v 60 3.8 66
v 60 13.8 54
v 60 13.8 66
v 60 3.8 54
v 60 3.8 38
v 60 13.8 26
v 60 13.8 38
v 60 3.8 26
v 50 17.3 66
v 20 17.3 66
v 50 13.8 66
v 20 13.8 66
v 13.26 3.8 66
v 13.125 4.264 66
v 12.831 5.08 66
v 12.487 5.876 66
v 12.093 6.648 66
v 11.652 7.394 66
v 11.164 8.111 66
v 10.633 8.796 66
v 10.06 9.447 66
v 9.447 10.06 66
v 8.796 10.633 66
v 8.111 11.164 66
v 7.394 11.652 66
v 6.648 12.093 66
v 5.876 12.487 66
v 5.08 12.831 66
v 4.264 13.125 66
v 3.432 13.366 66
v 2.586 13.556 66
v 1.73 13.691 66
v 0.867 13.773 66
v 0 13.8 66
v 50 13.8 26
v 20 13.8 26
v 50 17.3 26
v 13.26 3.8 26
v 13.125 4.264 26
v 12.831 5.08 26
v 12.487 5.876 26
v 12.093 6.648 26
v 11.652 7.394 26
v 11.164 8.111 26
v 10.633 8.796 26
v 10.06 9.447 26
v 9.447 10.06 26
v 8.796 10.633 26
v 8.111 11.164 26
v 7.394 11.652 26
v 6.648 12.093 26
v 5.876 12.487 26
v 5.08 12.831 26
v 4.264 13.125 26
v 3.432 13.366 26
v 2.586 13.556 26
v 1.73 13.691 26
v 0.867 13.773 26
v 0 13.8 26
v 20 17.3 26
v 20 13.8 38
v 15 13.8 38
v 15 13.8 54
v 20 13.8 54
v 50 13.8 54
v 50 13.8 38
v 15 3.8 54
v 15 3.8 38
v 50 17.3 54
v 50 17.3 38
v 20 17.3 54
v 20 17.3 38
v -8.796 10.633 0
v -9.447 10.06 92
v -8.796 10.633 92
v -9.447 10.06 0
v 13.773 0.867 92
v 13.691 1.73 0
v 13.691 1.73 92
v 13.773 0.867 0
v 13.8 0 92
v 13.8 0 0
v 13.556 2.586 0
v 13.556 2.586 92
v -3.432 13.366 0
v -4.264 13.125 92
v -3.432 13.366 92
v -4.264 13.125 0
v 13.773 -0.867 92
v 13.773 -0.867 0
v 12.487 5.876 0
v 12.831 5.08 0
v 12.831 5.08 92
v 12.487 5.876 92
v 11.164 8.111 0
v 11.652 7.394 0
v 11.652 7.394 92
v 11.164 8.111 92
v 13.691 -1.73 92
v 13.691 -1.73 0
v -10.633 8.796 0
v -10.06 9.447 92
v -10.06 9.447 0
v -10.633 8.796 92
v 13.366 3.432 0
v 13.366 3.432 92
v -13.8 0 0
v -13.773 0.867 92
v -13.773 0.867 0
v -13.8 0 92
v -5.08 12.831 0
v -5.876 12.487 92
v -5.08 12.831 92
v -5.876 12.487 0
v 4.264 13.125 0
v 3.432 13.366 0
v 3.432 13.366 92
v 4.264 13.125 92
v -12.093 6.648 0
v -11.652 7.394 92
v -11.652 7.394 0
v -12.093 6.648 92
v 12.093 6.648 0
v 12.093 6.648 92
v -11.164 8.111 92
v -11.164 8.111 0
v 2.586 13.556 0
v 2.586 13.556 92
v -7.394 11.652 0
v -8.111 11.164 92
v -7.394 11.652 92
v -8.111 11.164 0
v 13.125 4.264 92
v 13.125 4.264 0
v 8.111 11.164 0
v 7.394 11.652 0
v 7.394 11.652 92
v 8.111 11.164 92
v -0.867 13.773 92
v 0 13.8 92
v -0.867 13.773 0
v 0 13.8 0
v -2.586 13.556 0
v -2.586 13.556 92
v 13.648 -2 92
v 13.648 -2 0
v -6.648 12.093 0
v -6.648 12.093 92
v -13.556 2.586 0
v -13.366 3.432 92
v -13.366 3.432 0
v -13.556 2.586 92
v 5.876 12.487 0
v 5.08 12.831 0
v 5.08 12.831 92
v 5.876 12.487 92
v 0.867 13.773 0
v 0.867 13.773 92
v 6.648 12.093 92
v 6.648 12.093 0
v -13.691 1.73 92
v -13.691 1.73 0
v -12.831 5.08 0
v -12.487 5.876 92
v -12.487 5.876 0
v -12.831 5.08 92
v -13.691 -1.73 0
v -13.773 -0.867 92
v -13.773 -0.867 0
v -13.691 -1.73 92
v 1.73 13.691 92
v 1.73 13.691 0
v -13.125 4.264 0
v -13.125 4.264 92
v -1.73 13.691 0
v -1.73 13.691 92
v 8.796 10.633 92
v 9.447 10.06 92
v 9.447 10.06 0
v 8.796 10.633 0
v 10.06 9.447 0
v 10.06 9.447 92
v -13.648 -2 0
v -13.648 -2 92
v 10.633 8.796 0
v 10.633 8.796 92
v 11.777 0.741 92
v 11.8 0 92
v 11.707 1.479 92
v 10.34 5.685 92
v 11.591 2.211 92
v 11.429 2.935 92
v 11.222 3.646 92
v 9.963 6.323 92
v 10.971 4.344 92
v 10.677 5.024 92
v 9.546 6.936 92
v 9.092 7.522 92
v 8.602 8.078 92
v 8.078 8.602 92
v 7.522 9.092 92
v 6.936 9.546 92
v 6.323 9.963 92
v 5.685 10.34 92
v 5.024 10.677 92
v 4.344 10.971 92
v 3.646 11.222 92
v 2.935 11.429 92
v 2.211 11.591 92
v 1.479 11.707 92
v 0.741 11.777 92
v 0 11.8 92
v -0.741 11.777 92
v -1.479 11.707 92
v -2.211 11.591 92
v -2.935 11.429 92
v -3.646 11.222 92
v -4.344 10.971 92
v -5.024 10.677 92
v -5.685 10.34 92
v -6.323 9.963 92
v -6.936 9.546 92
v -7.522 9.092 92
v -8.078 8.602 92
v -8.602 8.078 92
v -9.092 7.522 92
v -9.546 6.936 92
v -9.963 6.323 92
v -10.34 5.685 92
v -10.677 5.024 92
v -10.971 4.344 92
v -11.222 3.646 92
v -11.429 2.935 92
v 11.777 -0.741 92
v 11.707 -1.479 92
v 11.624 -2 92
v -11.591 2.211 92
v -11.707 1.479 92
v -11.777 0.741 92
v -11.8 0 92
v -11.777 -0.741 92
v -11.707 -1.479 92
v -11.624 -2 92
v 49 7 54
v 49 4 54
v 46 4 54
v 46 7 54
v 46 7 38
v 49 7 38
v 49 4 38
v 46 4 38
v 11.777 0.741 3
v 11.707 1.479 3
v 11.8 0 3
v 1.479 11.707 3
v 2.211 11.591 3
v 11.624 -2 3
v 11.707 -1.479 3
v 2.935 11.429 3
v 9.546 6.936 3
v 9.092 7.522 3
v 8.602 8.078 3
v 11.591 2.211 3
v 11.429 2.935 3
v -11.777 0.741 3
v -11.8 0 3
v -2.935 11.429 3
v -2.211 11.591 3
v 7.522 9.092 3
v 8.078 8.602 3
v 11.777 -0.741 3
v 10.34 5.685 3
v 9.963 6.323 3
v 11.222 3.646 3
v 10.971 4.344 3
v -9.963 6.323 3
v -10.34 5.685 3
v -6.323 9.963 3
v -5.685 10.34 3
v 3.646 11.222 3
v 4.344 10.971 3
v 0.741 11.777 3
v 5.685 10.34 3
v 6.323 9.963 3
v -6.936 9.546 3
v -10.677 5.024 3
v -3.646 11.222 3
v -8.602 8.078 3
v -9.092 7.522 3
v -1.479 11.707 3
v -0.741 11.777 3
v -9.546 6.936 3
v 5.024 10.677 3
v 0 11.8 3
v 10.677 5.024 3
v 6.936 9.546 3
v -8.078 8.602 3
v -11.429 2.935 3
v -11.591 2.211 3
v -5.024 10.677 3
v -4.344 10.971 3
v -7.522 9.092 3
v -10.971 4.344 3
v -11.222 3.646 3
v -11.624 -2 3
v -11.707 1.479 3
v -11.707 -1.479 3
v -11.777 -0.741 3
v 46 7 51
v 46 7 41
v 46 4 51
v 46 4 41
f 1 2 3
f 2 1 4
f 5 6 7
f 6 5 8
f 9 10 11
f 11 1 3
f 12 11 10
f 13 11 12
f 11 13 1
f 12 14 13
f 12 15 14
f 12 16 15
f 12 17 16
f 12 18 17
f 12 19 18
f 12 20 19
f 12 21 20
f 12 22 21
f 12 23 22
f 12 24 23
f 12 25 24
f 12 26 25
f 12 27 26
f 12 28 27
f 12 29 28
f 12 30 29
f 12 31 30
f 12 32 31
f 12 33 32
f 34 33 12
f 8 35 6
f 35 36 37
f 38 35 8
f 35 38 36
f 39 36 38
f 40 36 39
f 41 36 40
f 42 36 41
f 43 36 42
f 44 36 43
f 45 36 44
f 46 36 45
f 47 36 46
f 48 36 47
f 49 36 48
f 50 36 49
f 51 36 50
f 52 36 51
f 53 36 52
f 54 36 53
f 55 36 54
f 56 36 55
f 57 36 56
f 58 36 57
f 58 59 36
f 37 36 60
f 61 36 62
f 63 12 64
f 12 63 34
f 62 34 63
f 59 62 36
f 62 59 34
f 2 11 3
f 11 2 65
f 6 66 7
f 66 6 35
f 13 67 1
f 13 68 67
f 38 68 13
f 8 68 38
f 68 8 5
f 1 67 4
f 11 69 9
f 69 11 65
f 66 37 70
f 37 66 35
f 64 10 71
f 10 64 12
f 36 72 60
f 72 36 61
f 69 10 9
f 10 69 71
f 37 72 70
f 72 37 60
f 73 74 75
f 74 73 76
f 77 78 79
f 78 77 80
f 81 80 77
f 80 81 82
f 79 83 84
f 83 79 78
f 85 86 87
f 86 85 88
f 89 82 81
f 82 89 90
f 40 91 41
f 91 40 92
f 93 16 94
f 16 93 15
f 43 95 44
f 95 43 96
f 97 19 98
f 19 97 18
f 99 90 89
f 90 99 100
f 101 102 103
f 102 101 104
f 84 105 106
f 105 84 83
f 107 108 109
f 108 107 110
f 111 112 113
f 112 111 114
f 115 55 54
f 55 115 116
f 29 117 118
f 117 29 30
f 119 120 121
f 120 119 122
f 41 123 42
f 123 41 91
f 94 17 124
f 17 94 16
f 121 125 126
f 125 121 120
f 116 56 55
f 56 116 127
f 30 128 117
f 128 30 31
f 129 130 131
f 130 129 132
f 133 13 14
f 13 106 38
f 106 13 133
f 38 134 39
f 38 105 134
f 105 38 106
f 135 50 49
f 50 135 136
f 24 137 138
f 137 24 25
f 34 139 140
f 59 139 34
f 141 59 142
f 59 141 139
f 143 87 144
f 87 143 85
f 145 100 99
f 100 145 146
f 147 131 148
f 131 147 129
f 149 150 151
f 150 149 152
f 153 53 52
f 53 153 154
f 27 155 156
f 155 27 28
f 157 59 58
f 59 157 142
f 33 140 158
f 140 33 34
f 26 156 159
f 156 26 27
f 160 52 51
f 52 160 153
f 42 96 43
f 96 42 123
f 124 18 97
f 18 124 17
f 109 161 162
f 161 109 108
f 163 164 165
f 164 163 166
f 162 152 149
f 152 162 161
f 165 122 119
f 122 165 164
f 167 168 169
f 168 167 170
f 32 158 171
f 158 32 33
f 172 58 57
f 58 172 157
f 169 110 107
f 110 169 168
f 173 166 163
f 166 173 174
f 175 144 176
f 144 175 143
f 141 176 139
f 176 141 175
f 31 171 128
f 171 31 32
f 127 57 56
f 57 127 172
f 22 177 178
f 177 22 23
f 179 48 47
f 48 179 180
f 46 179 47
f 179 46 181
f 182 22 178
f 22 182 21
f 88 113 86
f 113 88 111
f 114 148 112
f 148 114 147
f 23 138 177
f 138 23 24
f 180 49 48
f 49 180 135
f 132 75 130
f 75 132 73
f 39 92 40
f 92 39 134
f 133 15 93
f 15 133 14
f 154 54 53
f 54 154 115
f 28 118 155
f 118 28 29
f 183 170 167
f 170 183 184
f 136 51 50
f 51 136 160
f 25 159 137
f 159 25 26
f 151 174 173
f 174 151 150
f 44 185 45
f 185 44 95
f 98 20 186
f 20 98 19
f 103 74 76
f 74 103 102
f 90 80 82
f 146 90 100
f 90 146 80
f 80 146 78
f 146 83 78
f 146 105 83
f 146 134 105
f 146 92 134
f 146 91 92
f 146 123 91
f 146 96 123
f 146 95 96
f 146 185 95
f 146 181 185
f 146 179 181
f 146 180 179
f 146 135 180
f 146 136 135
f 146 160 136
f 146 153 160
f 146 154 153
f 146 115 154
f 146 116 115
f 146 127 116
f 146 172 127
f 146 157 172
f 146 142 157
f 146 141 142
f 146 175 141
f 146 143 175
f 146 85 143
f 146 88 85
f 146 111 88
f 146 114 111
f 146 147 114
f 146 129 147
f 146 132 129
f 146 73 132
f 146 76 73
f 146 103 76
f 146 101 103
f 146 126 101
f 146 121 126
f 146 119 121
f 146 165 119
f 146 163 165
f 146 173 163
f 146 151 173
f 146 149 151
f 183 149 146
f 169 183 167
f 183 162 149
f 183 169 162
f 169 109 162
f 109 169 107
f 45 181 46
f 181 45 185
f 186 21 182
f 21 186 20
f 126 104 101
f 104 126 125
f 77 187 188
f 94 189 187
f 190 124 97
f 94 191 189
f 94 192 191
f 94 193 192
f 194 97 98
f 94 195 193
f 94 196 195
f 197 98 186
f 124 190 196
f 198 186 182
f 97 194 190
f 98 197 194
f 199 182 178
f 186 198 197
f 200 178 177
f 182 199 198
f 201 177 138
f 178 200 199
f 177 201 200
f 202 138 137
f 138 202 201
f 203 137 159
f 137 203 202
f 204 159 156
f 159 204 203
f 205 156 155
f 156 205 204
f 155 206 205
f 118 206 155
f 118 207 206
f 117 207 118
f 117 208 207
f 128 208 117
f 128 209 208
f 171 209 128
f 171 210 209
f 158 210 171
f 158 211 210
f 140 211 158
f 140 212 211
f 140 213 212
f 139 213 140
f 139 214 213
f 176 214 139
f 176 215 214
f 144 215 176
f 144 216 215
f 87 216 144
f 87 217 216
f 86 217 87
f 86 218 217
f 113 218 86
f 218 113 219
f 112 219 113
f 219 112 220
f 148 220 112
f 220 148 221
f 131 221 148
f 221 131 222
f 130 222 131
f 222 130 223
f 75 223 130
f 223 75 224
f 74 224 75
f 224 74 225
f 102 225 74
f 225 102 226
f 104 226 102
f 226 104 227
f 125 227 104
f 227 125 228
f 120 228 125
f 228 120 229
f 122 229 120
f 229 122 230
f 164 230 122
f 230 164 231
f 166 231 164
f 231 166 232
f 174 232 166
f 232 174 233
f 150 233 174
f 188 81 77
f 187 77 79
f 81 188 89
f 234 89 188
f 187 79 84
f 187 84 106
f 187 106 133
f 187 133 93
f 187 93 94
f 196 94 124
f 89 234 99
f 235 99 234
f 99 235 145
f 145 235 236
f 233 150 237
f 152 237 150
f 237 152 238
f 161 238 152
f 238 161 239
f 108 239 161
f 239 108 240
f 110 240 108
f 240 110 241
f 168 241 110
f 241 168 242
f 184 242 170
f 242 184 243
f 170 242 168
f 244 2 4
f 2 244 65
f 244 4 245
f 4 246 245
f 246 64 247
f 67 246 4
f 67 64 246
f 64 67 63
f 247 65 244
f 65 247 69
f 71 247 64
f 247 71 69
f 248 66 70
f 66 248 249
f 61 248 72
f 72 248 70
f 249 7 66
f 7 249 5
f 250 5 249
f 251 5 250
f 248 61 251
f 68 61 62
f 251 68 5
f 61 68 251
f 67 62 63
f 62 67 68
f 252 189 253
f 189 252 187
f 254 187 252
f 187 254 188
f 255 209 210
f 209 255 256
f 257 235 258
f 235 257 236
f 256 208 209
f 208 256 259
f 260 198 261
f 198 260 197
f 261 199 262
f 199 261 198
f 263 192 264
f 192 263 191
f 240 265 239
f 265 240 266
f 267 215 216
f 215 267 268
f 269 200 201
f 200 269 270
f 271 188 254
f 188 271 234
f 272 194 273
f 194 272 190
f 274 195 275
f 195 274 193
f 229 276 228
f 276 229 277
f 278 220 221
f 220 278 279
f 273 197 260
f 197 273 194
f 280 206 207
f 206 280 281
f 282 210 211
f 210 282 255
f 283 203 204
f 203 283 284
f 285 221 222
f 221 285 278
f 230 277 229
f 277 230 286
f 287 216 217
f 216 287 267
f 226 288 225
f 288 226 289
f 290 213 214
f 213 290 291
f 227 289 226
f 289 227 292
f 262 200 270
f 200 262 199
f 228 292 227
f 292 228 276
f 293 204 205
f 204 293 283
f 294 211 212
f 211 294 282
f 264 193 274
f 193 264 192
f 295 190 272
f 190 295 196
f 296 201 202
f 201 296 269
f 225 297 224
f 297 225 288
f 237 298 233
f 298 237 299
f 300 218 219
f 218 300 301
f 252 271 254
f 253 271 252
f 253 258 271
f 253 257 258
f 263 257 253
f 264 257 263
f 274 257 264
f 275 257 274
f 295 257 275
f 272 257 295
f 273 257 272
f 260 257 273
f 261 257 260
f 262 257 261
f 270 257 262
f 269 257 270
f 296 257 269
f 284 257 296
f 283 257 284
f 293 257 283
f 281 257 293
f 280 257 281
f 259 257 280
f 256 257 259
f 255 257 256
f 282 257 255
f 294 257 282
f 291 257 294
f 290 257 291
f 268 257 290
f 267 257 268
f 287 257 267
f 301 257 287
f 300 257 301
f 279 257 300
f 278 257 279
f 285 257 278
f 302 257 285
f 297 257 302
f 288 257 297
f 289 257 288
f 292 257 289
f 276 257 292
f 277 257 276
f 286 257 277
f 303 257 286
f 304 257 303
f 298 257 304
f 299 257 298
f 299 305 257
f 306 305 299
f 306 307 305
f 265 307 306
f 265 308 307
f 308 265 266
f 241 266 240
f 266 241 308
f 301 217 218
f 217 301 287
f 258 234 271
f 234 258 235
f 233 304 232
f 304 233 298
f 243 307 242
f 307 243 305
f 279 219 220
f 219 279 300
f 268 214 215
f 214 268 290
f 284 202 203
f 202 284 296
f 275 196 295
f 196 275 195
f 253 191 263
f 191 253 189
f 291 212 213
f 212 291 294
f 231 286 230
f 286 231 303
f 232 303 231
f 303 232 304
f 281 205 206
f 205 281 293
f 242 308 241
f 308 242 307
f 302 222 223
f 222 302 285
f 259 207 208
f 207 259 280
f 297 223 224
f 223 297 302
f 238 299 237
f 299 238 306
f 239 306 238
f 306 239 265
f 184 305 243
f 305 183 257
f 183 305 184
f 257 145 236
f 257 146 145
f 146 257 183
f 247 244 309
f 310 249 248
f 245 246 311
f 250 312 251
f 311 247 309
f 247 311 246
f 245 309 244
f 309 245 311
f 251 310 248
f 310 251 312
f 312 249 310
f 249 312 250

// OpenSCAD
$fn = 100;

batteryR = 23.6/2;
caseR = batteryR + 2;
caseH = 92;
clipL = 3;

translate([0,00])
	difference(){
		union(){
			cylinder(h = caseH, r1 = caseR, r2 = caseR);
			translate([0,3.8,caseH/2-20]) {
				cube([60, 10, 40]);
				translate([20,0,0])  //extra hump
				cube([30, 13.5, 40]);
			}
		}
		translate([15,0,caseH/2-8])  //cut out to straddle the gopro
			cube([200,20,16]);
		translate([0,0,3])
			cylinder(h = caseH, r1 = batteryR, r2 = batteryR);
		translate([0,-caseR/2-2,caseH/2-.1]) //change to a whole cut for top half
			cube([3*caseR,caseR,caseH+2], center=true);

		//zip tie hoel
//		for(i = [0 : 1])
//		translate([55-i*10,8.8,0])
//			cylinder(h = caseH, r1 = 3, r2 = 3);


	}

//tines to hold this oh
translate([43,7,caseH/2-8])
rotate([90,0,0])
	linear_extrude(height=clipL) {
		spine();
		translate([0,16,0])
			mirror(v=[0,1,0])
				spine();
	}

module spine(){
	polygon(points=[[2*clipL,0],[clipL,0],[clipL,clipL]]);
}
